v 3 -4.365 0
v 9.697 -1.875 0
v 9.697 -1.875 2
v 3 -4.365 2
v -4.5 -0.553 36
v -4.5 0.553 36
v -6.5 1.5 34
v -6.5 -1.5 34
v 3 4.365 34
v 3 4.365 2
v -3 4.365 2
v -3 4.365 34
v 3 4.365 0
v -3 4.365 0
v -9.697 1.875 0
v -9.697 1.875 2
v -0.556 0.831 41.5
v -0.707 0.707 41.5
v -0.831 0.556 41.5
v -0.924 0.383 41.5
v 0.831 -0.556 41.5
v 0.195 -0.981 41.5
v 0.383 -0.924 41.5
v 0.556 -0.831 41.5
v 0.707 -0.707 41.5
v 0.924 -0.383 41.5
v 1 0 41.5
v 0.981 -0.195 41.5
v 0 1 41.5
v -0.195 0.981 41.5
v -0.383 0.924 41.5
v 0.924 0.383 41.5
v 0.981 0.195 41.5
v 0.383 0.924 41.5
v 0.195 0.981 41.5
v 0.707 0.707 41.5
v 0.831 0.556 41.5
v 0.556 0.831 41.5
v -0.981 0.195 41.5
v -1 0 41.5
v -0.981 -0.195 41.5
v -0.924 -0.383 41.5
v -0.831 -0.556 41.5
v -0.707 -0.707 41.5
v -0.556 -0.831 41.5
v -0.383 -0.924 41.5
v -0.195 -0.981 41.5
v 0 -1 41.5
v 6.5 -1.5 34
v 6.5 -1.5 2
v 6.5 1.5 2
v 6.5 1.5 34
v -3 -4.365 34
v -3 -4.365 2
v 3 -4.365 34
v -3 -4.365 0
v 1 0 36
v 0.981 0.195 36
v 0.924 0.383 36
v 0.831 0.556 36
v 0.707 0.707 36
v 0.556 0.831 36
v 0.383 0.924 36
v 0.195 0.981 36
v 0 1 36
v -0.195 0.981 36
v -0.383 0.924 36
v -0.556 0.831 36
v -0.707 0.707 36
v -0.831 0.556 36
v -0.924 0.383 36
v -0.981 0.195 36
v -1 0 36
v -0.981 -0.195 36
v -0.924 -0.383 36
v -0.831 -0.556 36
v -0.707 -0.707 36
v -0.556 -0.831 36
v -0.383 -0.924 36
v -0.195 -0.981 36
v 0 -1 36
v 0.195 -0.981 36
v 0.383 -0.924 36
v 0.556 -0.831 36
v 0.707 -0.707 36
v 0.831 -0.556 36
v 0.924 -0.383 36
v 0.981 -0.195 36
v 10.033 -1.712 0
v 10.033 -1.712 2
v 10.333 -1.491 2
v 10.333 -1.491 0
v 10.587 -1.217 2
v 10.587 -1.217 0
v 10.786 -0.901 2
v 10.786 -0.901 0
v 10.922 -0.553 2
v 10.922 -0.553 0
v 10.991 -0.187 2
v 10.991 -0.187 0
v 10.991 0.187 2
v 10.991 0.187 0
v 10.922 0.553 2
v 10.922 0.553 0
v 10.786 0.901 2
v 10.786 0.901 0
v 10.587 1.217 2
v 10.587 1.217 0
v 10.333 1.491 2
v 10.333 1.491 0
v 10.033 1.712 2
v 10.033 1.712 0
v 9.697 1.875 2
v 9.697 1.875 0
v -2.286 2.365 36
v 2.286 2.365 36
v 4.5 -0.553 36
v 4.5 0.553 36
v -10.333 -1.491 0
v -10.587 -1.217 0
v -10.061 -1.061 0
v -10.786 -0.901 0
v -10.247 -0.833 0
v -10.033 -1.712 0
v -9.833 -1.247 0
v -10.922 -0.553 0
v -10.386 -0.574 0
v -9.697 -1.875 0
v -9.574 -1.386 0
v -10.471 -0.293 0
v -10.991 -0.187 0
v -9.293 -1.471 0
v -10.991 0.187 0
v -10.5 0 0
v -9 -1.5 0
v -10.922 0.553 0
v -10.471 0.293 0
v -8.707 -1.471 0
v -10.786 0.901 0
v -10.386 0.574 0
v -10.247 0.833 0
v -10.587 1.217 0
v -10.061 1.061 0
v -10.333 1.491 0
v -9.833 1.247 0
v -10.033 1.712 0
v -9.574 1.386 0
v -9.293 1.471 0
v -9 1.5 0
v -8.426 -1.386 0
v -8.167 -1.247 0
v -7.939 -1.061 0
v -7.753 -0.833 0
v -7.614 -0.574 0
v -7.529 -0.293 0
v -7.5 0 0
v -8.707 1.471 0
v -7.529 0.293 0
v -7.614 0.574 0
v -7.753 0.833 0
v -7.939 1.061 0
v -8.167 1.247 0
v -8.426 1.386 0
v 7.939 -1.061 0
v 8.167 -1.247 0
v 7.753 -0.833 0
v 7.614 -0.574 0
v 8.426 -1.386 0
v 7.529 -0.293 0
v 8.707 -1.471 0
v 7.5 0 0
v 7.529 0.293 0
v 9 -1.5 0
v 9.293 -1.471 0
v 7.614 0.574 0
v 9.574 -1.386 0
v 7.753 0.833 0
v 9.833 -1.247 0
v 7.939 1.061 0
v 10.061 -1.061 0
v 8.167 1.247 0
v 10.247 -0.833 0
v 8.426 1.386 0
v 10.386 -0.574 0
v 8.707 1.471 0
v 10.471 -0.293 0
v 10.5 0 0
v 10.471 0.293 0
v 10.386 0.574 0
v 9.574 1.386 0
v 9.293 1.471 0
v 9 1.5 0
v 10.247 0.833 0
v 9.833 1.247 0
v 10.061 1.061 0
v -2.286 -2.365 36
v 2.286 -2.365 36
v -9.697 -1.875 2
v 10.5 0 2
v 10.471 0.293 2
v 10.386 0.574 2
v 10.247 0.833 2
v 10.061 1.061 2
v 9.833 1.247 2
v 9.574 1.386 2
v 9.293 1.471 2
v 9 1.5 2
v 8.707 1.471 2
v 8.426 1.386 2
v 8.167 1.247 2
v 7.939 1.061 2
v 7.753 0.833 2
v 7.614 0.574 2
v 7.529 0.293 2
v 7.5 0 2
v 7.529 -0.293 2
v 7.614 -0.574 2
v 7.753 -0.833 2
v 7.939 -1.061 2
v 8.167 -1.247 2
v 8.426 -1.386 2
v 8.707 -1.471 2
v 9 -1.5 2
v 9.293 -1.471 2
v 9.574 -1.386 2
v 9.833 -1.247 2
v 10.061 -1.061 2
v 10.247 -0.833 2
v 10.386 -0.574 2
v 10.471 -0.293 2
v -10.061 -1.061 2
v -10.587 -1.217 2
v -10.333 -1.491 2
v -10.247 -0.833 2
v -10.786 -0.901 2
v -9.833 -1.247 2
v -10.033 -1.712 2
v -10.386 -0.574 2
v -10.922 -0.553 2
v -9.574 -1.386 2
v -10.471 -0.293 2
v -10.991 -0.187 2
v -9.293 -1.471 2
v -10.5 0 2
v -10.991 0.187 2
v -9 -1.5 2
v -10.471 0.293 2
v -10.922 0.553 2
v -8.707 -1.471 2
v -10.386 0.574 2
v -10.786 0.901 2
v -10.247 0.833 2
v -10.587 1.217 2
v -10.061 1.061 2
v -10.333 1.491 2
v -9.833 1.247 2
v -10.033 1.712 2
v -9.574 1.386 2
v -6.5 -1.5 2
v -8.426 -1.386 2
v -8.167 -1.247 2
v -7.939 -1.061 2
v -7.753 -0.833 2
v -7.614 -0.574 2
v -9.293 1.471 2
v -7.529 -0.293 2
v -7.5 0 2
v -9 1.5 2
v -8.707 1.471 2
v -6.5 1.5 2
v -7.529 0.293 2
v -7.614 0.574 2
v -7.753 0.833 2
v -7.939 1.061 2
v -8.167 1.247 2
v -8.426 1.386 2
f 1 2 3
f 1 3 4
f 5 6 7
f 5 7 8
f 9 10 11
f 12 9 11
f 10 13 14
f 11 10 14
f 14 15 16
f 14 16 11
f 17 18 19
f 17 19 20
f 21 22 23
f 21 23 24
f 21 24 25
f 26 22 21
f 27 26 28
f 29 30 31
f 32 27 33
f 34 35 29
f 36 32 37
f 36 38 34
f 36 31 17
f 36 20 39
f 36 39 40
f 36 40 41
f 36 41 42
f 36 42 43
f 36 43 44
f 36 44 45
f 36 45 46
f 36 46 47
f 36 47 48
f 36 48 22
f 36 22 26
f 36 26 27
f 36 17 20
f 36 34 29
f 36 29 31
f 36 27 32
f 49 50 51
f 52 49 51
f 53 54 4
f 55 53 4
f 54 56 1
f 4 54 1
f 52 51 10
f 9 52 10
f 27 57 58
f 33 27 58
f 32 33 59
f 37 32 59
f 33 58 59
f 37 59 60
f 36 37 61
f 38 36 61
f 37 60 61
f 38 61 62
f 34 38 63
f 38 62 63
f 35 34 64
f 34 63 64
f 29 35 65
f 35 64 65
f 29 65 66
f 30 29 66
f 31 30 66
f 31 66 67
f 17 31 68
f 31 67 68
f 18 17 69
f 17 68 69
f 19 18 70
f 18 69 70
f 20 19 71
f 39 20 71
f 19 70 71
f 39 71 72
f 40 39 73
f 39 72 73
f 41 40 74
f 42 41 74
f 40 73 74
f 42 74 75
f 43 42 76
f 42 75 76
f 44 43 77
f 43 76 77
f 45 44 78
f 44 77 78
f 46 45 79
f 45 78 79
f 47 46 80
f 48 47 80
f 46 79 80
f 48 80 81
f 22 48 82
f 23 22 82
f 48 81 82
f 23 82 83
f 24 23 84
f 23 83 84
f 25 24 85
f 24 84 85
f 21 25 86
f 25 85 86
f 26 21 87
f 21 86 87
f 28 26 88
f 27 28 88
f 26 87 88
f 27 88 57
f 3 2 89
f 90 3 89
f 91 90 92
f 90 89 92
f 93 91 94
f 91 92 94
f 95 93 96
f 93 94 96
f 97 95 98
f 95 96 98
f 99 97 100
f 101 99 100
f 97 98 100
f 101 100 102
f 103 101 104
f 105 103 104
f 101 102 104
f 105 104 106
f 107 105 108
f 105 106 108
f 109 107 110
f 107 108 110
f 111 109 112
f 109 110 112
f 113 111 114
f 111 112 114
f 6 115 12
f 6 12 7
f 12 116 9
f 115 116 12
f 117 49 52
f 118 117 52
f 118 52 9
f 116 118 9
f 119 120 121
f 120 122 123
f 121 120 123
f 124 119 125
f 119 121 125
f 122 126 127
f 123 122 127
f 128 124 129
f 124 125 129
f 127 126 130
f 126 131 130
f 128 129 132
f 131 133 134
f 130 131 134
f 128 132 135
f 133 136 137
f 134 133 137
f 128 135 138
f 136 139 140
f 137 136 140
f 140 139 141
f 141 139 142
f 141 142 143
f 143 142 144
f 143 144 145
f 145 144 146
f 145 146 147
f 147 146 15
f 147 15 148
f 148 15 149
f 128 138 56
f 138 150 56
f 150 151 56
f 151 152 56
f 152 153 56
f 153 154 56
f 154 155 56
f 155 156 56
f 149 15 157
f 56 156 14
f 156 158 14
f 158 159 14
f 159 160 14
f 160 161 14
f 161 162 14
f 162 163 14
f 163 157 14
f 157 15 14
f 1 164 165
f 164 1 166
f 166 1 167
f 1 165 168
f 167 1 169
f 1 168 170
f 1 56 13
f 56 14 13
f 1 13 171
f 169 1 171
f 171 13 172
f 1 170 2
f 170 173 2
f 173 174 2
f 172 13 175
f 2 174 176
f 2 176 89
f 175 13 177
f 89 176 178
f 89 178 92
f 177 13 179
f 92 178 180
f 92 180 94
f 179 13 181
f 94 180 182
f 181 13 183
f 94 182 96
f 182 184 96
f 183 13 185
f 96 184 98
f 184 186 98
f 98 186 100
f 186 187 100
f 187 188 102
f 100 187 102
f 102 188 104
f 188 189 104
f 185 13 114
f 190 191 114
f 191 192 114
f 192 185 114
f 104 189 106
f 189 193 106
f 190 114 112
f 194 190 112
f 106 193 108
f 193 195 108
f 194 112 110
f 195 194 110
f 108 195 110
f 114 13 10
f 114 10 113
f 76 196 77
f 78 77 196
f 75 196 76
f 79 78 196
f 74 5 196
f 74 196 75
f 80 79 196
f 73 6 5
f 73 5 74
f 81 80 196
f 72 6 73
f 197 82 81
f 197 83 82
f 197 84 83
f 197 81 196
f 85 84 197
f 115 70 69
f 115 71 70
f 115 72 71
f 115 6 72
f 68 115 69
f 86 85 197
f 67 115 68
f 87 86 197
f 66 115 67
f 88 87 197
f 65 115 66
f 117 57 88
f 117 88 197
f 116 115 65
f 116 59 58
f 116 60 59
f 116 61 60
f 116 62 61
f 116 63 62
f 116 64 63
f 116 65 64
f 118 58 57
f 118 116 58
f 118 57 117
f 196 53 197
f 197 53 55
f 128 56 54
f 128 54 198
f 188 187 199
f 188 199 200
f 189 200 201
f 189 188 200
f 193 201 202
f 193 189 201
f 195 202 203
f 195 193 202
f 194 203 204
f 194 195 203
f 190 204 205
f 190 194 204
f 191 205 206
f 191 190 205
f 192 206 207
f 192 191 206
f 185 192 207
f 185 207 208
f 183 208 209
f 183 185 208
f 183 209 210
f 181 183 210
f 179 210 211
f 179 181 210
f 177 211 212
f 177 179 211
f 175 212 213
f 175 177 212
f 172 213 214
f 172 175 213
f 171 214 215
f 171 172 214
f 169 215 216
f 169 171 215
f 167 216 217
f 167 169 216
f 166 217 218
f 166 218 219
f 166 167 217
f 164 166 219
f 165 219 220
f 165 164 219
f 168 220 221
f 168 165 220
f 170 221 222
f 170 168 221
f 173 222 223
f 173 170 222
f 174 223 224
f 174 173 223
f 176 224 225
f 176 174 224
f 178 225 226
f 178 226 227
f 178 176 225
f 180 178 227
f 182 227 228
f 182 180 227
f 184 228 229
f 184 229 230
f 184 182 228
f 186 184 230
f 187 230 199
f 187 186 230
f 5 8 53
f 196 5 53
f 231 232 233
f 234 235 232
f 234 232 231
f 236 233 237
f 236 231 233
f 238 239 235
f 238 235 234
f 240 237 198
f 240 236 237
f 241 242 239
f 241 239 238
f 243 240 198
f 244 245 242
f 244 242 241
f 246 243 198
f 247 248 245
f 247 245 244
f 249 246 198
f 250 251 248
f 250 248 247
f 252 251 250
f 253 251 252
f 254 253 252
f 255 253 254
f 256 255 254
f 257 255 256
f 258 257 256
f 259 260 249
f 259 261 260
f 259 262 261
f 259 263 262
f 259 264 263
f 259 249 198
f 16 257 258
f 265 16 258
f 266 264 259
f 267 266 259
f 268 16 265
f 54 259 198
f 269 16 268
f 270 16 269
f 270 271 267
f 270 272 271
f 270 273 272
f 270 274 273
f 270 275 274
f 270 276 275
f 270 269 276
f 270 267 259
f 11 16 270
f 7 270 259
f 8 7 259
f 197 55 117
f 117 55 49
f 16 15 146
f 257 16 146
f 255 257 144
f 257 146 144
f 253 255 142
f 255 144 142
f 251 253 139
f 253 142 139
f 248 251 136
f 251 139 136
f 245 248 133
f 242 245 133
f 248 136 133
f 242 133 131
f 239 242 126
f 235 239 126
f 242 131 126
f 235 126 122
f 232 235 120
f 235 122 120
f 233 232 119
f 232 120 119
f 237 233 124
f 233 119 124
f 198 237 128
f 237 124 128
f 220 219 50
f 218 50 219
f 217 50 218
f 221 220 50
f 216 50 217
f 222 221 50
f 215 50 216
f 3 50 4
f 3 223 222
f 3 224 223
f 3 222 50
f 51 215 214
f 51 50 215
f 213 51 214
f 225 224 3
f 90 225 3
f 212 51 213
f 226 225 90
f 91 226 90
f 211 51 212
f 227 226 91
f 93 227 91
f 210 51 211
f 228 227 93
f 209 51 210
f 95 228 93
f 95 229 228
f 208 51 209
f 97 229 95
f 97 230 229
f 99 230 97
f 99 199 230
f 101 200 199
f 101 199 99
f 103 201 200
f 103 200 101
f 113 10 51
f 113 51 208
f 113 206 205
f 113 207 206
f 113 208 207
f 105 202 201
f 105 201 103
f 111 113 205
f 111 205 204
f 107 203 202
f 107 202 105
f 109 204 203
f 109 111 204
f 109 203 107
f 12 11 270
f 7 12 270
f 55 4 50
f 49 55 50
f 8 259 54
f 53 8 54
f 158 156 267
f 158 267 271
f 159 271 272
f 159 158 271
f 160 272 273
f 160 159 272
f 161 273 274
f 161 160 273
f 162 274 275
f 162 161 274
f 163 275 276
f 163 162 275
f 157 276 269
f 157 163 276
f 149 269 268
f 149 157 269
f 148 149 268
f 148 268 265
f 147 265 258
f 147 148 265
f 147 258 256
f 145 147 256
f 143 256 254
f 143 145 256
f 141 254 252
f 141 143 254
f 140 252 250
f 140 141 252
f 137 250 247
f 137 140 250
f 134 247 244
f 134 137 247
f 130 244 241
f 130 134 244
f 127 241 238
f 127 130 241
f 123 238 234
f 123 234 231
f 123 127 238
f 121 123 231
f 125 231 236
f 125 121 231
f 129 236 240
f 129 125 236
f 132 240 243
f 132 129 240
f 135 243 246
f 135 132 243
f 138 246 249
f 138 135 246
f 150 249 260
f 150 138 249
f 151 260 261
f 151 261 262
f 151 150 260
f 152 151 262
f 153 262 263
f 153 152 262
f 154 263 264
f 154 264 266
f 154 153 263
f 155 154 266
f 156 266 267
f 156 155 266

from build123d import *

# Parameters (mm, degrees)
SKETCH_R     = 1.5
PAD_DEPTH    = 2
PAD001_DEPTH = 34
CHAMFER_SIZE = 2
SKETCH002_R  = 1
PAD002_DEPTH = 5.5


with BuildPart() as part:
    # Sketch → Pad (new body)
    with BuildSketch(Plane.XY):
        with BuildLine():
            ThreePointArc((-9.697093, 1.874583), (-11, 0), (-9.697093, -1.874583))
            Line((-3, -4.365), (-9.697093, -1.874583))
            Line((3, -4.365), (-3, -4.365))
            Line((9.697093, -1.874583), (3, -4.365))
            ThreePointArc((9.697093, -1.874583), (11, 0), (9.697093, 1.874583))
            Line((3, 4.365), (9.697093, 1.874583))
            Line((-3, 4.365), (3, 4.365))
            Line((-9.697093, 1.874583), (-3, 4.365))
        make_face()
        with Locations((-9, 0)):
            Circle(SKETCH_R, mode=Mode.SUBTRACT)
        with Locations((9, 0)):
            Circle(SKETCH_R, mode=Mode.SUBTRACT)
    extrude(amount=PAD_DEPTH)

    # Sketch001 (on Face12 of Pad) → Pad001 (join)
    with BuildSketch(Plane.XY.offset(2)):
        Polygon((-3, 4.365), (-6.5, 1.5), (-6.5, -1.5), (-3, -4.365), (3, -4.365), (6.5, -1.5), (6.5, 1.5), (3, 4.365), align=None)
    extrude(amount=PAD001_DEPTH)

    # Chamfer
    chamfer_edges = [part.edges().sort_by_distance(p)[0] for p in [
        (6.5, 0, 36),
        (4.75, -2.9325, 36),
        (0, -4.365, 36),
        (-4.75, -2.9325, 36),
        (-6.5, 0, 36),
        (-4.75, 2.9325, 36),
        (0, 4.365, 36),
        (4.75, 2.9325, 36),
    ]]
    chamfer(chamfer_edges, length=CHAMFER_SIZE)

    # Sketch002 (on Face9 of Chamfer) → Pad002 (join)
    with BuildSketch(Plane.XY.offset(36)):
        Circle(SKETCH002_R)
    extrude(amount=PAD002_DEPTH)


solid = part.part
